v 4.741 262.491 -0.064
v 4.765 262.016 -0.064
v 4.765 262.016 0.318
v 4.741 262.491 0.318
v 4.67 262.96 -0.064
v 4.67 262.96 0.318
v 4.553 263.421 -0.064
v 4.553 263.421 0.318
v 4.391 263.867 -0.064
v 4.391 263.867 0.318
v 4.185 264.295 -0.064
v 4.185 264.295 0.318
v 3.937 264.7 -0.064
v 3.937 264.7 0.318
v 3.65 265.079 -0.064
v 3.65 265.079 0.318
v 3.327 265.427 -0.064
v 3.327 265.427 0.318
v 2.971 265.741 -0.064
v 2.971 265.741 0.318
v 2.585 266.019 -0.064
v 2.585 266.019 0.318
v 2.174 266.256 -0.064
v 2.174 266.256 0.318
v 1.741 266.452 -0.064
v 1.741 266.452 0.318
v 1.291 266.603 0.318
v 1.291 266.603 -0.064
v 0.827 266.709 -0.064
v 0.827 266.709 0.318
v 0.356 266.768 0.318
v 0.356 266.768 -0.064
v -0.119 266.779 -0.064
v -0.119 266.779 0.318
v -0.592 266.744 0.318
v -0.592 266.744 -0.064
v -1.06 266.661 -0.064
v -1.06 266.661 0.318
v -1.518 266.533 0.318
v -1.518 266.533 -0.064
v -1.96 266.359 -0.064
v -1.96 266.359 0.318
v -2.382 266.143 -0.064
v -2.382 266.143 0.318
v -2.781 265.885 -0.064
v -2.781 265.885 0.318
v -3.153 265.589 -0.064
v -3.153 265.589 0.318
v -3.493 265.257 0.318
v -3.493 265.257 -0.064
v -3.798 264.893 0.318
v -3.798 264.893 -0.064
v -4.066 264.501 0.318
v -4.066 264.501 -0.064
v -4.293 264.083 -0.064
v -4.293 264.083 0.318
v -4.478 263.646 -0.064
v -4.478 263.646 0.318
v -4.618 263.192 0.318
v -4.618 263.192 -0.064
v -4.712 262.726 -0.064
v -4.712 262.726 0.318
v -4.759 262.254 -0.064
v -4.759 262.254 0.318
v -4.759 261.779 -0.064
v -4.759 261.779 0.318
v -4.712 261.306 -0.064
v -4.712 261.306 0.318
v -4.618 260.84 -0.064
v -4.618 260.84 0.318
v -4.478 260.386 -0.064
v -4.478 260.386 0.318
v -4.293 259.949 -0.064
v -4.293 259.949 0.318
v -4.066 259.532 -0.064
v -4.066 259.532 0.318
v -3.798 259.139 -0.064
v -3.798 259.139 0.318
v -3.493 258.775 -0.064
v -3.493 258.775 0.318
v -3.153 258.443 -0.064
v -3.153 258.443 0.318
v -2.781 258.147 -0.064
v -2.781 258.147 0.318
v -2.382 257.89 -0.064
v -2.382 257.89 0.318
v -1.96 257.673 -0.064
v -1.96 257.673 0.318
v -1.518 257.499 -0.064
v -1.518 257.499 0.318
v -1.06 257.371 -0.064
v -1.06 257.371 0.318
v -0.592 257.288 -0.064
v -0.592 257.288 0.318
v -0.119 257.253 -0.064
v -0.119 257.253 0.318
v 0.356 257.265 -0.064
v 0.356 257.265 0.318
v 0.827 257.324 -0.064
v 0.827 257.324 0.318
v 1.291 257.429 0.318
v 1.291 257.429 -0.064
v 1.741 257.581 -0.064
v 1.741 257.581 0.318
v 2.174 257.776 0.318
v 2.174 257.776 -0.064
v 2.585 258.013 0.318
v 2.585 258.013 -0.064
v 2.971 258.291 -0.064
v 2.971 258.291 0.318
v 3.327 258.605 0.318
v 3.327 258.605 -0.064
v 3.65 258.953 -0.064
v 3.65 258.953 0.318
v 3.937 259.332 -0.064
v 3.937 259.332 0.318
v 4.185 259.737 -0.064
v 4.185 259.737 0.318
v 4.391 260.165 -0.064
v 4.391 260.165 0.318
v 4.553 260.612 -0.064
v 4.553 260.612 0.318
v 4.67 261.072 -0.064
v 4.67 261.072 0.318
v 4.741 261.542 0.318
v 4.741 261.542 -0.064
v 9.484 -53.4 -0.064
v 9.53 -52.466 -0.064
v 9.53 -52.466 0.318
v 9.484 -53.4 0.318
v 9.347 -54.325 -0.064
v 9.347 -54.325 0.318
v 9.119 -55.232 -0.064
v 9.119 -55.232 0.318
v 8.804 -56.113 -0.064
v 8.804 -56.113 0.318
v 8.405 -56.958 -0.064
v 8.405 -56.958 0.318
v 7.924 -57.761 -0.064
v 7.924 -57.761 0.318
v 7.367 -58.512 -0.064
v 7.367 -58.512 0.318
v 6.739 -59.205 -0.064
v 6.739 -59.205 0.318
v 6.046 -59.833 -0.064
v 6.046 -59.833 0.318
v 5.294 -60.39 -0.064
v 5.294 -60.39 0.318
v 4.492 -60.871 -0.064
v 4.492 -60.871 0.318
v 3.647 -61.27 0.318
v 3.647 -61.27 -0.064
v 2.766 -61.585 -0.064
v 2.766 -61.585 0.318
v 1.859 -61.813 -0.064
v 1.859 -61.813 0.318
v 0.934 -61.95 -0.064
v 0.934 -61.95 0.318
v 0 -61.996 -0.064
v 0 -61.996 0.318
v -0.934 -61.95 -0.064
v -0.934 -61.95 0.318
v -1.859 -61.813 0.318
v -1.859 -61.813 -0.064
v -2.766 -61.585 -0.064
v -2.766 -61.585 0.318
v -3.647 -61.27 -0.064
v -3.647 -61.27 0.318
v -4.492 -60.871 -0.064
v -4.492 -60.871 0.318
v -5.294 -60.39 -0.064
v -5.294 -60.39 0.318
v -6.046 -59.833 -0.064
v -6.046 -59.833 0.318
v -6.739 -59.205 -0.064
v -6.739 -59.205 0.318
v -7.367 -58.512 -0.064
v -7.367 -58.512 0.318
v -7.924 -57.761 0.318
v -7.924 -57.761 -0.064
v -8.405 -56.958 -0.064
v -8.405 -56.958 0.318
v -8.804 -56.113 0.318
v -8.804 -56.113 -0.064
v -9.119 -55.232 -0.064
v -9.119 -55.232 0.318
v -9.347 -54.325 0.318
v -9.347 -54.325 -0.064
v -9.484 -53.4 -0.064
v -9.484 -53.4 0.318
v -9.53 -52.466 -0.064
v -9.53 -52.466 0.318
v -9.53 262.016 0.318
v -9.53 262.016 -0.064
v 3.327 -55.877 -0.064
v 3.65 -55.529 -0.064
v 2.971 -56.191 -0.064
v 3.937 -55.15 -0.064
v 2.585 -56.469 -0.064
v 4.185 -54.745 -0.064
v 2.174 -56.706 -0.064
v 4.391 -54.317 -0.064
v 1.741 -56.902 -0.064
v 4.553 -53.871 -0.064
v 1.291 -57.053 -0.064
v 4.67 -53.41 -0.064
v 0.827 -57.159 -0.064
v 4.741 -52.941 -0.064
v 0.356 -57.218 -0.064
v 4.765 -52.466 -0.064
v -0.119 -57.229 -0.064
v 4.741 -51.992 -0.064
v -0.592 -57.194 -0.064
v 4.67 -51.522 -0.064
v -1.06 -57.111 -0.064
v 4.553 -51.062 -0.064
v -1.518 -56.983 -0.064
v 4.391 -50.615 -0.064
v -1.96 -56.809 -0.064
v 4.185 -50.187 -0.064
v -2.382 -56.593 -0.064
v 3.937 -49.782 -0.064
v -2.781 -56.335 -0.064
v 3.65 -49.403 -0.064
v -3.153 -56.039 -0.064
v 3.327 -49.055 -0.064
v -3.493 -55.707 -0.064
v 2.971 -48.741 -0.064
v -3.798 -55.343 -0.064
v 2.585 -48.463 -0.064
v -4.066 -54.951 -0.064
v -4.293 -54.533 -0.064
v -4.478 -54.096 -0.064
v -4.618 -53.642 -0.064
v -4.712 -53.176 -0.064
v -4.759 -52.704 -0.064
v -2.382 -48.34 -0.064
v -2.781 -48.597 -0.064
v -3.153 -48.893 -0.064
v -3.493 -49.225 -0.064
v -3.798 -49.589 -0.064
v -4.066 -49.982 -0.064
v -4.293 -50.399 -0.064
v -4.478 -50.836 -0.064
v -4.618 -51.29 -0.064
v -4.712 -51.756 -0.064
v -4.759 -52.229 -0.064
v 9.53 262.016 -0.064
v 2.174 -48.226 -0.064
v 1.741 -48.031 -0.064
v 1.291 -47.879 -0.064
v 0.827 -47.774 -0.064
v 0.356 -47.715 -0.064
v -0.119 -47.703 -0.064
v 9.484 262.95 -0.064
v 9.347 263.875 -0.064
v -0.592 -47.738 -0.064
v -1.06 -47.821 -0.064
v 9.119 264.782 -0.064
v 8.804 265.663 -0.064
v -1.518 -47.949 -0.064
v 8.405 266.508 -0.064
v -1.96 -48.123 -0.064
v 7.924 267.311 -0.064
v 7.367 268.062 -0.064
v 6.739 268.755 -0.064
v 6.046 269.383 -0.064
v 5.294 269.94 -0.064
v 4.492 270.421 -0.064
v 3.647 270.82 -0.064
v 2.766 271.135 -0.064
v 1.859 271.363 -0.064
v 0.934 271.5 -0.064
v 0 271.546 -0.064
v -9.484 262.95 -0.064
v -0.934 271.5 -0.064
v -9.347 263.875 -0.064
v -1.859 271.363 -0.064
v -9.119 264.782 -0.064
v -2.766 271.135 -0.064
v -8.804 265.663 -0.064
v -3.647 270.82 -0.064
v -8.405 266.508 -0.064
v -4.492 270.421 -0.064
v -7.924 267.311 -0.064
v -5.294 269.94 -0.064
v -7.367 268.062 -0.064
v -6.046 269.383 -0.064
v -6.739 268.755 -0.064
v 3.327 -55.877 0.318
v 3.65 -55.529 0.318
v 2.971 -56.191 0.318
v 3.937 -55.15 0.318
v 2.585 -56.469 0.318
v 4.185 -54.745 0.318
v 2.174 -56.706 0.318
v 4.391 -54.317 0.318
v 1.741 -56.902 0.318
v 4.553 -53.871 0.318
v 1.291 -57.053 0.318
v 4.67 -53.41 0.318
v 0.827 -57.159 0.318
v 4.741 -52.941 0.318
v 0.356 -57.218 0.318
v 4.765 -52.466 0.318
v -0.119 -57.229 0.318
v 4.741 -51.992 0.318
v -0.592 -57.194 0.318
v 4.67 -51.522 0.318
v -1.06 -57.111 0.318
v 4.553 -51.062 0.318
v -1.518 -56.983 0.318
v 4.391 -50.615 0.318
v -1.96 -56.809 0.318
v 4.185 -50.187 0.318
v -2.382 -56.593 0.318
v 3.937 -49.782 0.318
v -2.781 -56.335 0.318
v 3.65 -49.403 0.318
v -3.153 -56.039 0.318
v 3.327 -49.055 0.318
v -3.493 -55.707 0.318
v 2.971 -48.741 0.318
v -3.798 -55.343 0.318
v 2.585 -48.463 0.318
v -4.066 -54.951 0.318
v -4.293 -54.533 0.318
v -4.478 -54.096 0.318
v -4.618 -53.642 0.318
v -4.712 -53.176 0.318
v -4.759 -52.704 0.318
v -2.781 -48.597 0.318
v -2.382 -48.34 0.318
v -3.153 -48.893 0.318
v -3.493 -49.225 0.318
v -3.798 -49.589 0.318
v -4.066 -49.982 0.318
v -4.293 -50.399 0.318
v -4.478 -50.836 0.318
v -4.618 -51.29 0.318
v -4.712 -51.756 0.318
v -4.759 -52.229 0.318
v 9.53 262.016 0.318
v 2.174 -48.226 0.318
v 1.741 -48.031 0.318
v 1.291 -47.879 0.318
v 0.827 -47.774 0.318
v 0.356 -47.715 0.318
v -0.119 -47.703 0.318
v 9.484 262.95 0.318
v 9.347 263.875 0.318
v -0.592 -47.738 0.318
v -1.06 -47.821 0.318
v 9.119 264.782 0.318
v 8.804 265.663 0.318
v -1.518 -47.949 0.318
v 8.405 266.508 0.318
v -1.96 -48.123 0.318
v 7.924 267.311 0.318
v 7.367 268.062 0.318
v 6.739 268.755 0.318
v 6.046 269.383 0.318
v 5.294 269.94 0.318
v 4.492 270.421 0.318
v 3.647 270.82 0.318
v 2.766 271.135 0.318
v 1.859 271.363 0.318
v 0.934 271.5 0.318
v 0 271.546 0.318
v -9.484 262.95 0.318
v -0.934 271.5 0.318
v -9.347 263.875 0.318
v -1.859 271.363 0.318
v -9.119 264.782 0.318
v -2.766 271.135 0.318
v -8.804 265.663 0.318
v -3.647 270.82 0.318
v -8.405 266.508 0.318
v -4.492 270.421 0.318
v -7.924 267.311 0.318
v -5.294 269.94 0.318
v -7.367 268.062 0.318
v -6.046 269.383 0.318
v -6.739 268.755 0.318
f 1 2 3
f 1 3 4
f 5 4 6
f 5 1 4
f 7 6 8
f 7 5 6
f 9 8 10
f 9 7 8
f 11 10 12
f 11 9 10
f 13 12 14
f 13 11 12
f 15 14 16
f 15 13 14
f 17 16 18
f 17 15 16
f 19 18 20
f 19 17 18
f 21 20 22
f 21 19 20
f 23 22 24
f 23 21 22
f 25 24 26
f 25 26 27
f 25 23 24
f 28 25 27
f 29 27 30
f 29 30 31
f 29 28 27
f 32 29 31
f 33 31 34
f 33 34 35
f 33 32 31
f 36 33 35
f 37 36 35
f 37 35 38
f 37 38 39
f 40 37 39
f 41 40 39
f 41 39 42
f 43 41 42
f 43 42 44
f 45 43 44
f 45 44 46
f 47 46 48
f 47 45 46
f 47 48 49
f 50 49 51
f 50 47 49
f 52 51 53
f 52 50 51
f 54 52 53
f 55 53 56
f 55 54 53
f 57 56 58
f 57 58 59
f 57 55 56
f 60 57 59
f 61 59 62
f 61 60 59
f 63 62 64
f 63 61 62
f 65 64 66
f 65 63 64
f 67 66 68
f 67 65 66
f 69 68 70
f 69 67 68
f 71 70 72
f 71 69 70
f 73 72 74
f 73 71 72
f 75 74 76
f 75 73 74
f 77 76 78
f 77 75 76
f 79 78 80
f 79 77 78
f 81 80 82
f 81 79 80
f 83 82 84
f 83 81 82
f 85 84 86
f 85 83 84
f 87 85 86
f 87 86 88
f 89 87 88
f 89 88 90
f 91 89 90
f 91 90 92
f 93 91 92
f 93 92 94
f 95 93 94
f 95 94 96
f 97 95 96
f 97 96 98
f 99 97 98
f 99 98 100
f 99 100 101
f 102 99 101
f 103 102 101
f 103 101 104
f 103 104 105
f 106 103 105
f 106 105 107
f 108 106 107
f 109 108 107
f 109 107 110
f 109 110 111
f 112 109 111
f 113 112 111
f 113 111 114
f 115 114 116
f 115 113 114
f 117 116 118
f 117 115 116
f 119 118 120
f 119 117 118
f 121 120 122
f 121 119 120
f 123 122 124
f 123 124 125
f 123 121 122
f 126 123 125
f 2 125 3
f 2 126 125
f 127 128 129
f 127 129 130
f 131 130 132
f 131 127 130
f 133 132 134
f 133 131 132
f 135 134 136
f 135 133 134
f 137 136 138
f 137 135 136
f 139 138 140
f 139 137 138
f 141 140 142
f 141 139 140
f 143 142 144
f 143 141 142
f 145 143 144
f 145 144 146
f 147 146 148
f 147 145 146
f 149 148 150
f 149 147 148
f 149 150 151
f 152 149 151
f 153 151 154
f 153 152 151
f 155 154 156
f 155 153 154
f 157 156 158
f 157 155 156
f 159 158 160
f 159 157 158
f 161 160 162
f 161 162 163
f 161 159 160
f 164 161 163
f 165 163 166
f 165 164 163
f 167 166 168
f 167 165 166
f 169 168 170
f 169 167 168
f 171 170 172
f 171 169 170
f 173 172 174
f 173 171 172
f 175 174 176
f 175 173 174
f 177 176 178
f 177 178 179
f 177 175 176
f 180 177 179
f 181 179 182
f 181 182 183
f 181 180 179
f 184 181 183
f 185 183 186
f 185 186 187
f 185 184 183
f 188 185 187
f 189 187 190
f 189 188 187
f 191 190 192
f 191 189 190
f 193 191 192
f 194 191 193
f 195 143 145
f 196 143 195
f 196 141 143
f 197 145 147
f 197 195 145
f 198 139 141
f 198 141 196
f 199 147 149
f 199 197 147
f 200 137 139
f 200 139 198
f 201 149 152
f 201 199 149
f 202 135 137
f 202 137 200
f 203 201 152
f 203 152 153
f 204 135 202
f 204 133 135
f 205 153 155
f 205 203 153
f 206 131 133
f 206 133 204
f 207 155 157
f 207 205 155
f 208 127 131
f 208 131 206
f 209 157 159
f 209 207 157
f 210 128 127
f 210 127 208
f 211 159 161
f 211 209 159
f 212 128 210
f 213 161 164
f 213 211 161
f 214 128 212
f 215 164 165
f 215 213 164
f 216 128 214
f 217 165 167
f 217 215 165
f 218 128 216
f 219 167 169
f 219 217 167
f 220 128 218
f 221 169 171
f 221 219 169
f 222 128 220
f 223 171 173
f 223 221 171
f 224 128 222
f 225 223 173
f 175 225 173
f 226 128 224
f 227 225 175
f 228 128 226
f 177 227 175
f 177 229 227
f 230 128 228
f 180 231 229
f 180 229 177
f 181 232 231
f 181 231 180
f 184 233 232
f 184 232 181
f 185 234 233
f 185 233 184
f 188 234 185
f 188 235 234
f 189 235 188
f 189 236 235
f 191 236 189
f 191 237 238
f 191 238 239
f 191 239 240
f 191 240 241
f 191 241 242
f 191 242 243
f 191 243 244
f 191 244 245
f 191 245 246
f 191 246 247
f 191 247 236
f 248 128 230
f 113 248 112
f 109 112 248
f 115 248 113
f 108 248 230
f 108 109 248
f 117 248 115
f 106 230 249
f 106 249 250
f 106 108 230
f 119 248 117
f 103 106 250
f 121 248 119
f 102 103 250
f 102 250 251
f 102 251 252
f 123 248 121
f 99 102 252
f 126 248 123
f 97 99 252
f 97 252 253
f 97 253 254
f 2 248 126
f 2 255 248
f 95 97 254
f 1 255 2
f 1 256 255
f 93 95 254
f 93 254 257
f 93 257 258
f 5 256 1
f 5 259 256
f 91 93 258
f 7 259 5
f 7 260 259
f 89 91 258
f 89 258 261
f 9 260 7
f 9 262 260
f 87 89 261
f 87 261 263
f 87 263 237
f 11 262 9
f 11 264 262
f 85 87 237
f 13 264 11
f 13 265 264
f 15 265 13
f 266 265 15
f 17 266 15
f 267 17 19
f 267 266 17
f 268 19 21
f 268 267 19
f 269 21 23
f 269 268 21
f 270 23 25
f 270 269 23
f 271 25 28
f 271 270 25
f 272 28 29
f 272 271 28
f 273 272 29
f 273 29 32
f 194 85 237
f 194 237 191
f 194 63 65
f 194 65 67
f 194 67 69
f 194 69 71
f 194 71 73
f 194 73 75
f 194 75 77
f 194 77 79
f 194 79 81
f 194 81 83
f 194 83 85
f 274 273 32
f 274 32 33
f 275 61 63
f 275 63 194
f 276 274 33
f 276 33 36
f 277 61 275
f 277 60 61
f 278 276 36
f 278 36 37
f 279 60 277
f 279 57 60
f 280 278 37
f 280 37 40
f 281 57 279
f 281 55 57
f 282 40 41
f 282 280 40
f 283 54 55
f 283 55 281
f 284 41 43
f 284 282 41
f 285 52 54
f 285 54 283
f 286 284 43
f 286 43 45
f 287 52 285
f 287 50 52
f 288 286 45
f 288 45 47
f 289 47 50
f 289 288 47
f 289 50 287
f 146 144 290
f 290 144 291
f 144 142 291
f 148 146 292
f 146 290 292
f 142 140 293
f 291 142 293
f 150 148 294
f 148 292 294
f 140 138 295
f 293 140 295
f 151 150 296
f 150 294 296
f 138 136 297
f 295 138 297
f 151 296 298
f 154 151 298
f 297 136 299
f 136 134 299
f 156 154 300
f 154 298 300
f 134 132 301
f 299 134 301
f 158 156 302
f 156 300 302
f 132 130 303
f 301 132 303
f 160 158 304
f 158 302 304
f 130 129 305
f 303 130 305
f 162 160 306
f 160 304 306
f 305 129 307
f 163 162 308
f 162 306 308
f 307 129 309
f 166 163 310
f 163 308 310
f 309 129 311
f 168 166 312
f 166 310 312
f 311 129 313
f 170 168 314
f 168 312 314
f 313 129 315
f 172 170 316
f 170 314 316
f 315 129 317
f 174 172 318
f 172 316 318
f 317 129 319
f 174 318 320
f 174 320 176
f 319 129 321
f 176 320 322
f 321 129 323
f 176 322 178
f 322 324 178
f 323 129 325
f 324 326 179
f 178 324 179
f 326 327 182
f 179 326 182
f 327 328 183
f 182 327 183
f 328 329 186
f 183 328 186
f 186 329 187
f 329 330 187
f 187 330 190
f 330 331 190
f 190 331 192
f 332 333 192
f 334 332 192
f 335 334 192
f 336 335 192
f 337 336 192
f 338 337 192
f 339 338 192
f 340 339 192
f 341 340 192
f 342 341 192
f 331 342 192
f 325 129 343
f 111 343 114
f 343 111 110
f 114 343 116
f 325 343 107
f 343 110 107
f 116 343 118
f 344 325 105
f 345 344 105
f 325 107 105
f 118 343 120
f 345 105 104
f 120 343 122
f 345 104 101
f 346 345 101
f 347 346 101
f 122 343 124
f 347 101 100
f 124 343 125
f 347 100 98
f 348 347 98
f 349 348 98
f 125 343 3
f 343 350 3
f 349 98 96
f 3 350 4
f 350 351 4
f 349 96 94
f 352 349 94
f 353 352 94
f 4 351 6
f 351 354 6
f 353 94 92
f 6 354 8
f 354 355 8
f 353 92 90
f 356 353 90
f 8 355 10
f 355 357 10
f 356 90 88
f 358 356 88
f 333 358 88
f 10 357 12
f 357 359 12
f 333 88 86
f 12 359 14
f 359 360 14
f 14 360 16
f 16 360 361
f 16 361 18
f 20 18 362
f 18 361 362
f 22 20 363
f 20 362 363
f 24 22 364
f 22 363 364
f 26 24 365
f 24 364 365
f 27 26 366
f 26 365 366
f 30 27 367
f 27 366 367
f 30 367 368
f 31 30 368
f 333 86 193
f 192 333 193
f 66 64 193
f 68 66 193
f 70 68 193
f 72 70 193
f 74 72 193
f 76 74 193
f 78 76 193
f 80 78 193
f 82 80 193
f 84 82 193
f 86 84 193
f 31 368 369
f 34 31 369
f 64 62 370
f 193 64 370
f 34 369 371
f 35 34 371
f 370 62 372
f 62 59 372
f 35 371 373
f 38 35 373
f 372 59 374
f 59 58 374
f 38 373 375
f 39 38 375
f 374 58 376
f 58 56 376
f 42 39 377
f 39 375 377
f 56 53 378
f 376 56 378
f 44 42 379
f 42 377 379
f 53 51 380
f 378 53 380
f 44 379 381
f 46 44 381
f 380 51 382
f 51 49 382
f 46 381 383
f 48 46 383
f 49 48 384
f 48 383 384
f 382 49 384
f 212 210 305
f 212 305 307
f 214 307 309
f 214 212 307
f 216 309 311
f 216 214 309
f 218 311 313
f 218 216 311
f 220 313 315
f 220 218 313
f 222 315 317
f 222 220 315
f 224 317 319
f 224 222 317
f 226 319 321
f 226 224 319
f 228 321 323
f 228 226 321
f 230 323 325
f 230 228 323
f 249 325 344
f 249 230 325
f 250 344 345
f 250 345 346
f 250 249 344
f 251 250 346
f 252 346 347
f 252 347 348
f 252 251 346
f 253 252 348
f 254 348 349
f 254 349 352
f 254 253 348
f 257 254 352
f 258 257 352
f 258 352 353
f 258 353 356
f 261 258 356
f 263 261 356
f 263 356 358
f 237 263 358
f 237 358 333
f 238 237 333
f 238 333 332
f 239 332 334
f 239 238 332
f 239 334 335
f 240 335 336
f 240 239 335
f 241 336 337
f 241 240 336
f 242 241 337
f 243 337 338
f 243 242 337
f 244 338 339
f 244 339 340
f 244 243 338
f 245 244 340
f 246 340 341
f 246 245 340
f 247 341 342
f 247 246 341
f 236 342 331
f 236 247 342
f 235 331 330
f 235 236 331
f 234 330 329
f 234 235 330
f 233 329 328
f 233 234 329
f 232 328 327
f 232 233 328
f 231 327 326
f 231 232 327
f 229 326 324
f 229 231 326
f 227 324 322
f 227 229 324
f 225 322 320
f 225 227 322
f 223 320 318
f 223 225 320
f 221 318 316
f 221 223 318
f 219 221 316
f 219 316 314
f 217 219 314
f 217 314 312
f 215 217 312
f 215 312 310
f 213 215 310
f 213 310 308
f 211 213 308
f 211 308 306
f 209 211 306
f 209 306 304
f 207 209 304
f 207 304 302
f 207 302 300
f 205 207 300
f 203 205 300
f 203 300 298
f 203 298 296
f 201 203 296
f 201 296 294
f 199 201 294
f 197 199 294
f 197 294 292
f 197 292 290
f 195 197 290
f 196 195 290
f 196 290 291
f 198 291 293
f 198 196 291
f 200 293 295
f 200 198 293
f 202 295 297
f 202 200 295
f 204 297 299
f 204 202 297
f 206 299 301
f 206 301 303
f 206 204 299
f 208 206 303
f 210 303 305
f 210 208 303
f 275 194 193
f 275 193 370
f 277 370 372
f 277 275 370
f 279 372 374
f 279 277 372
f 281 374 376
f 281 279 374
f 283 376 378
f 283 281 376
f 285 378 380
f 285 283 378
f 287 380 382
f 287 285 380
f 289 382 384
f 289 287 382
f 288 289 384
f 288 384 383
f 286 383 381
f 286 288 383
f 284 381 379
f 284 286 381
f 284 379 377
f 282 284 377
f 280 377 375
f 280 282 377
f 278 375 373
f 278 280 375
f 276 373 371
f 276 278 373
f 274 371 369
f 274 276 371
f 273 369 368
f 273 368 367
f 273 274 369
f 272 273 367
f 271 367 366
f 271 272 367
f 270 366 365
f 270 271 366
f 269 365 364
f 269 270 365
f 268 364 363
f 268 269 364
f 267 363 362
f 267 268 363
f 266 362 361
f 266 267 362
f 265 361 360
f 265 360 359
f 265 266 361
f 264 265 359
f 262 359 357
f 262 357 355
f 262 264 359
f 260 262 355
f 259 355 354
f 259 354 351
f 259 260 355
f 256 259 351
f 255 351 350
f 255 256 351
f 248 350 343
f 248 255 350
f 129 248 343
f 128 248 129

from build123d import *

# Parameters (mm, degrees)
SKETCH2_R           = 3.175
BOSS_EXTRUDE1_DEPTH = 0.254
SCALE1_SCALE        = 1.5
SCALE3_SCALE        = 1.5
SCALE5_SCALE        = 0.667


with BuildPart() as part:
    # Sketch2 → Boss-Extrude1 (new body)
    with BuildSketch(Plane.XY):
        with BuildLine():
            Line((6.35, 209.55), (6.35, 0))
            ThreePointArc((6.35, 0), (0, -6.35), (-6.35, 0))
            Line((-6.35, 0), (-6.35, 209.55))
            ThreePointArc((-6.35, 209.55), (0, 215.9), (6.35, 209.55))
        make_face()
        with Locations((0, 209.55)):
            Circle(SKETCH2_R, mode=Mode.SUBTRACT)
        Circle(SKETCH2_R, mode=Mode.SUBTRACT)
    extrude(amount=BOSS_EXTRUDE1_DEPTH)


with BuildPart() as part_1:
    # Scale1: scaled about (0, 104.775, 0.127)
    add(part.part.scale(SCALE1_SCALE).moved(Location((0, -52.3875, -0.0635))))


with BuildPart() as part_2:
    # Scale3: scaled about (0, 104.775, 0.127)
    add(part_1.part.scale(SCALE3_SCALE).moved(Location((0, -52.3875, -0.0635))))


with BuildPart() as part_3:
    # Scale5: scaled about (0, 104.775, 0.127)
    add(part_2.part.scale(SCALE5_SCALE).moved(Location((0, 34.890075, 0.042291))))


solid = part_3.part
